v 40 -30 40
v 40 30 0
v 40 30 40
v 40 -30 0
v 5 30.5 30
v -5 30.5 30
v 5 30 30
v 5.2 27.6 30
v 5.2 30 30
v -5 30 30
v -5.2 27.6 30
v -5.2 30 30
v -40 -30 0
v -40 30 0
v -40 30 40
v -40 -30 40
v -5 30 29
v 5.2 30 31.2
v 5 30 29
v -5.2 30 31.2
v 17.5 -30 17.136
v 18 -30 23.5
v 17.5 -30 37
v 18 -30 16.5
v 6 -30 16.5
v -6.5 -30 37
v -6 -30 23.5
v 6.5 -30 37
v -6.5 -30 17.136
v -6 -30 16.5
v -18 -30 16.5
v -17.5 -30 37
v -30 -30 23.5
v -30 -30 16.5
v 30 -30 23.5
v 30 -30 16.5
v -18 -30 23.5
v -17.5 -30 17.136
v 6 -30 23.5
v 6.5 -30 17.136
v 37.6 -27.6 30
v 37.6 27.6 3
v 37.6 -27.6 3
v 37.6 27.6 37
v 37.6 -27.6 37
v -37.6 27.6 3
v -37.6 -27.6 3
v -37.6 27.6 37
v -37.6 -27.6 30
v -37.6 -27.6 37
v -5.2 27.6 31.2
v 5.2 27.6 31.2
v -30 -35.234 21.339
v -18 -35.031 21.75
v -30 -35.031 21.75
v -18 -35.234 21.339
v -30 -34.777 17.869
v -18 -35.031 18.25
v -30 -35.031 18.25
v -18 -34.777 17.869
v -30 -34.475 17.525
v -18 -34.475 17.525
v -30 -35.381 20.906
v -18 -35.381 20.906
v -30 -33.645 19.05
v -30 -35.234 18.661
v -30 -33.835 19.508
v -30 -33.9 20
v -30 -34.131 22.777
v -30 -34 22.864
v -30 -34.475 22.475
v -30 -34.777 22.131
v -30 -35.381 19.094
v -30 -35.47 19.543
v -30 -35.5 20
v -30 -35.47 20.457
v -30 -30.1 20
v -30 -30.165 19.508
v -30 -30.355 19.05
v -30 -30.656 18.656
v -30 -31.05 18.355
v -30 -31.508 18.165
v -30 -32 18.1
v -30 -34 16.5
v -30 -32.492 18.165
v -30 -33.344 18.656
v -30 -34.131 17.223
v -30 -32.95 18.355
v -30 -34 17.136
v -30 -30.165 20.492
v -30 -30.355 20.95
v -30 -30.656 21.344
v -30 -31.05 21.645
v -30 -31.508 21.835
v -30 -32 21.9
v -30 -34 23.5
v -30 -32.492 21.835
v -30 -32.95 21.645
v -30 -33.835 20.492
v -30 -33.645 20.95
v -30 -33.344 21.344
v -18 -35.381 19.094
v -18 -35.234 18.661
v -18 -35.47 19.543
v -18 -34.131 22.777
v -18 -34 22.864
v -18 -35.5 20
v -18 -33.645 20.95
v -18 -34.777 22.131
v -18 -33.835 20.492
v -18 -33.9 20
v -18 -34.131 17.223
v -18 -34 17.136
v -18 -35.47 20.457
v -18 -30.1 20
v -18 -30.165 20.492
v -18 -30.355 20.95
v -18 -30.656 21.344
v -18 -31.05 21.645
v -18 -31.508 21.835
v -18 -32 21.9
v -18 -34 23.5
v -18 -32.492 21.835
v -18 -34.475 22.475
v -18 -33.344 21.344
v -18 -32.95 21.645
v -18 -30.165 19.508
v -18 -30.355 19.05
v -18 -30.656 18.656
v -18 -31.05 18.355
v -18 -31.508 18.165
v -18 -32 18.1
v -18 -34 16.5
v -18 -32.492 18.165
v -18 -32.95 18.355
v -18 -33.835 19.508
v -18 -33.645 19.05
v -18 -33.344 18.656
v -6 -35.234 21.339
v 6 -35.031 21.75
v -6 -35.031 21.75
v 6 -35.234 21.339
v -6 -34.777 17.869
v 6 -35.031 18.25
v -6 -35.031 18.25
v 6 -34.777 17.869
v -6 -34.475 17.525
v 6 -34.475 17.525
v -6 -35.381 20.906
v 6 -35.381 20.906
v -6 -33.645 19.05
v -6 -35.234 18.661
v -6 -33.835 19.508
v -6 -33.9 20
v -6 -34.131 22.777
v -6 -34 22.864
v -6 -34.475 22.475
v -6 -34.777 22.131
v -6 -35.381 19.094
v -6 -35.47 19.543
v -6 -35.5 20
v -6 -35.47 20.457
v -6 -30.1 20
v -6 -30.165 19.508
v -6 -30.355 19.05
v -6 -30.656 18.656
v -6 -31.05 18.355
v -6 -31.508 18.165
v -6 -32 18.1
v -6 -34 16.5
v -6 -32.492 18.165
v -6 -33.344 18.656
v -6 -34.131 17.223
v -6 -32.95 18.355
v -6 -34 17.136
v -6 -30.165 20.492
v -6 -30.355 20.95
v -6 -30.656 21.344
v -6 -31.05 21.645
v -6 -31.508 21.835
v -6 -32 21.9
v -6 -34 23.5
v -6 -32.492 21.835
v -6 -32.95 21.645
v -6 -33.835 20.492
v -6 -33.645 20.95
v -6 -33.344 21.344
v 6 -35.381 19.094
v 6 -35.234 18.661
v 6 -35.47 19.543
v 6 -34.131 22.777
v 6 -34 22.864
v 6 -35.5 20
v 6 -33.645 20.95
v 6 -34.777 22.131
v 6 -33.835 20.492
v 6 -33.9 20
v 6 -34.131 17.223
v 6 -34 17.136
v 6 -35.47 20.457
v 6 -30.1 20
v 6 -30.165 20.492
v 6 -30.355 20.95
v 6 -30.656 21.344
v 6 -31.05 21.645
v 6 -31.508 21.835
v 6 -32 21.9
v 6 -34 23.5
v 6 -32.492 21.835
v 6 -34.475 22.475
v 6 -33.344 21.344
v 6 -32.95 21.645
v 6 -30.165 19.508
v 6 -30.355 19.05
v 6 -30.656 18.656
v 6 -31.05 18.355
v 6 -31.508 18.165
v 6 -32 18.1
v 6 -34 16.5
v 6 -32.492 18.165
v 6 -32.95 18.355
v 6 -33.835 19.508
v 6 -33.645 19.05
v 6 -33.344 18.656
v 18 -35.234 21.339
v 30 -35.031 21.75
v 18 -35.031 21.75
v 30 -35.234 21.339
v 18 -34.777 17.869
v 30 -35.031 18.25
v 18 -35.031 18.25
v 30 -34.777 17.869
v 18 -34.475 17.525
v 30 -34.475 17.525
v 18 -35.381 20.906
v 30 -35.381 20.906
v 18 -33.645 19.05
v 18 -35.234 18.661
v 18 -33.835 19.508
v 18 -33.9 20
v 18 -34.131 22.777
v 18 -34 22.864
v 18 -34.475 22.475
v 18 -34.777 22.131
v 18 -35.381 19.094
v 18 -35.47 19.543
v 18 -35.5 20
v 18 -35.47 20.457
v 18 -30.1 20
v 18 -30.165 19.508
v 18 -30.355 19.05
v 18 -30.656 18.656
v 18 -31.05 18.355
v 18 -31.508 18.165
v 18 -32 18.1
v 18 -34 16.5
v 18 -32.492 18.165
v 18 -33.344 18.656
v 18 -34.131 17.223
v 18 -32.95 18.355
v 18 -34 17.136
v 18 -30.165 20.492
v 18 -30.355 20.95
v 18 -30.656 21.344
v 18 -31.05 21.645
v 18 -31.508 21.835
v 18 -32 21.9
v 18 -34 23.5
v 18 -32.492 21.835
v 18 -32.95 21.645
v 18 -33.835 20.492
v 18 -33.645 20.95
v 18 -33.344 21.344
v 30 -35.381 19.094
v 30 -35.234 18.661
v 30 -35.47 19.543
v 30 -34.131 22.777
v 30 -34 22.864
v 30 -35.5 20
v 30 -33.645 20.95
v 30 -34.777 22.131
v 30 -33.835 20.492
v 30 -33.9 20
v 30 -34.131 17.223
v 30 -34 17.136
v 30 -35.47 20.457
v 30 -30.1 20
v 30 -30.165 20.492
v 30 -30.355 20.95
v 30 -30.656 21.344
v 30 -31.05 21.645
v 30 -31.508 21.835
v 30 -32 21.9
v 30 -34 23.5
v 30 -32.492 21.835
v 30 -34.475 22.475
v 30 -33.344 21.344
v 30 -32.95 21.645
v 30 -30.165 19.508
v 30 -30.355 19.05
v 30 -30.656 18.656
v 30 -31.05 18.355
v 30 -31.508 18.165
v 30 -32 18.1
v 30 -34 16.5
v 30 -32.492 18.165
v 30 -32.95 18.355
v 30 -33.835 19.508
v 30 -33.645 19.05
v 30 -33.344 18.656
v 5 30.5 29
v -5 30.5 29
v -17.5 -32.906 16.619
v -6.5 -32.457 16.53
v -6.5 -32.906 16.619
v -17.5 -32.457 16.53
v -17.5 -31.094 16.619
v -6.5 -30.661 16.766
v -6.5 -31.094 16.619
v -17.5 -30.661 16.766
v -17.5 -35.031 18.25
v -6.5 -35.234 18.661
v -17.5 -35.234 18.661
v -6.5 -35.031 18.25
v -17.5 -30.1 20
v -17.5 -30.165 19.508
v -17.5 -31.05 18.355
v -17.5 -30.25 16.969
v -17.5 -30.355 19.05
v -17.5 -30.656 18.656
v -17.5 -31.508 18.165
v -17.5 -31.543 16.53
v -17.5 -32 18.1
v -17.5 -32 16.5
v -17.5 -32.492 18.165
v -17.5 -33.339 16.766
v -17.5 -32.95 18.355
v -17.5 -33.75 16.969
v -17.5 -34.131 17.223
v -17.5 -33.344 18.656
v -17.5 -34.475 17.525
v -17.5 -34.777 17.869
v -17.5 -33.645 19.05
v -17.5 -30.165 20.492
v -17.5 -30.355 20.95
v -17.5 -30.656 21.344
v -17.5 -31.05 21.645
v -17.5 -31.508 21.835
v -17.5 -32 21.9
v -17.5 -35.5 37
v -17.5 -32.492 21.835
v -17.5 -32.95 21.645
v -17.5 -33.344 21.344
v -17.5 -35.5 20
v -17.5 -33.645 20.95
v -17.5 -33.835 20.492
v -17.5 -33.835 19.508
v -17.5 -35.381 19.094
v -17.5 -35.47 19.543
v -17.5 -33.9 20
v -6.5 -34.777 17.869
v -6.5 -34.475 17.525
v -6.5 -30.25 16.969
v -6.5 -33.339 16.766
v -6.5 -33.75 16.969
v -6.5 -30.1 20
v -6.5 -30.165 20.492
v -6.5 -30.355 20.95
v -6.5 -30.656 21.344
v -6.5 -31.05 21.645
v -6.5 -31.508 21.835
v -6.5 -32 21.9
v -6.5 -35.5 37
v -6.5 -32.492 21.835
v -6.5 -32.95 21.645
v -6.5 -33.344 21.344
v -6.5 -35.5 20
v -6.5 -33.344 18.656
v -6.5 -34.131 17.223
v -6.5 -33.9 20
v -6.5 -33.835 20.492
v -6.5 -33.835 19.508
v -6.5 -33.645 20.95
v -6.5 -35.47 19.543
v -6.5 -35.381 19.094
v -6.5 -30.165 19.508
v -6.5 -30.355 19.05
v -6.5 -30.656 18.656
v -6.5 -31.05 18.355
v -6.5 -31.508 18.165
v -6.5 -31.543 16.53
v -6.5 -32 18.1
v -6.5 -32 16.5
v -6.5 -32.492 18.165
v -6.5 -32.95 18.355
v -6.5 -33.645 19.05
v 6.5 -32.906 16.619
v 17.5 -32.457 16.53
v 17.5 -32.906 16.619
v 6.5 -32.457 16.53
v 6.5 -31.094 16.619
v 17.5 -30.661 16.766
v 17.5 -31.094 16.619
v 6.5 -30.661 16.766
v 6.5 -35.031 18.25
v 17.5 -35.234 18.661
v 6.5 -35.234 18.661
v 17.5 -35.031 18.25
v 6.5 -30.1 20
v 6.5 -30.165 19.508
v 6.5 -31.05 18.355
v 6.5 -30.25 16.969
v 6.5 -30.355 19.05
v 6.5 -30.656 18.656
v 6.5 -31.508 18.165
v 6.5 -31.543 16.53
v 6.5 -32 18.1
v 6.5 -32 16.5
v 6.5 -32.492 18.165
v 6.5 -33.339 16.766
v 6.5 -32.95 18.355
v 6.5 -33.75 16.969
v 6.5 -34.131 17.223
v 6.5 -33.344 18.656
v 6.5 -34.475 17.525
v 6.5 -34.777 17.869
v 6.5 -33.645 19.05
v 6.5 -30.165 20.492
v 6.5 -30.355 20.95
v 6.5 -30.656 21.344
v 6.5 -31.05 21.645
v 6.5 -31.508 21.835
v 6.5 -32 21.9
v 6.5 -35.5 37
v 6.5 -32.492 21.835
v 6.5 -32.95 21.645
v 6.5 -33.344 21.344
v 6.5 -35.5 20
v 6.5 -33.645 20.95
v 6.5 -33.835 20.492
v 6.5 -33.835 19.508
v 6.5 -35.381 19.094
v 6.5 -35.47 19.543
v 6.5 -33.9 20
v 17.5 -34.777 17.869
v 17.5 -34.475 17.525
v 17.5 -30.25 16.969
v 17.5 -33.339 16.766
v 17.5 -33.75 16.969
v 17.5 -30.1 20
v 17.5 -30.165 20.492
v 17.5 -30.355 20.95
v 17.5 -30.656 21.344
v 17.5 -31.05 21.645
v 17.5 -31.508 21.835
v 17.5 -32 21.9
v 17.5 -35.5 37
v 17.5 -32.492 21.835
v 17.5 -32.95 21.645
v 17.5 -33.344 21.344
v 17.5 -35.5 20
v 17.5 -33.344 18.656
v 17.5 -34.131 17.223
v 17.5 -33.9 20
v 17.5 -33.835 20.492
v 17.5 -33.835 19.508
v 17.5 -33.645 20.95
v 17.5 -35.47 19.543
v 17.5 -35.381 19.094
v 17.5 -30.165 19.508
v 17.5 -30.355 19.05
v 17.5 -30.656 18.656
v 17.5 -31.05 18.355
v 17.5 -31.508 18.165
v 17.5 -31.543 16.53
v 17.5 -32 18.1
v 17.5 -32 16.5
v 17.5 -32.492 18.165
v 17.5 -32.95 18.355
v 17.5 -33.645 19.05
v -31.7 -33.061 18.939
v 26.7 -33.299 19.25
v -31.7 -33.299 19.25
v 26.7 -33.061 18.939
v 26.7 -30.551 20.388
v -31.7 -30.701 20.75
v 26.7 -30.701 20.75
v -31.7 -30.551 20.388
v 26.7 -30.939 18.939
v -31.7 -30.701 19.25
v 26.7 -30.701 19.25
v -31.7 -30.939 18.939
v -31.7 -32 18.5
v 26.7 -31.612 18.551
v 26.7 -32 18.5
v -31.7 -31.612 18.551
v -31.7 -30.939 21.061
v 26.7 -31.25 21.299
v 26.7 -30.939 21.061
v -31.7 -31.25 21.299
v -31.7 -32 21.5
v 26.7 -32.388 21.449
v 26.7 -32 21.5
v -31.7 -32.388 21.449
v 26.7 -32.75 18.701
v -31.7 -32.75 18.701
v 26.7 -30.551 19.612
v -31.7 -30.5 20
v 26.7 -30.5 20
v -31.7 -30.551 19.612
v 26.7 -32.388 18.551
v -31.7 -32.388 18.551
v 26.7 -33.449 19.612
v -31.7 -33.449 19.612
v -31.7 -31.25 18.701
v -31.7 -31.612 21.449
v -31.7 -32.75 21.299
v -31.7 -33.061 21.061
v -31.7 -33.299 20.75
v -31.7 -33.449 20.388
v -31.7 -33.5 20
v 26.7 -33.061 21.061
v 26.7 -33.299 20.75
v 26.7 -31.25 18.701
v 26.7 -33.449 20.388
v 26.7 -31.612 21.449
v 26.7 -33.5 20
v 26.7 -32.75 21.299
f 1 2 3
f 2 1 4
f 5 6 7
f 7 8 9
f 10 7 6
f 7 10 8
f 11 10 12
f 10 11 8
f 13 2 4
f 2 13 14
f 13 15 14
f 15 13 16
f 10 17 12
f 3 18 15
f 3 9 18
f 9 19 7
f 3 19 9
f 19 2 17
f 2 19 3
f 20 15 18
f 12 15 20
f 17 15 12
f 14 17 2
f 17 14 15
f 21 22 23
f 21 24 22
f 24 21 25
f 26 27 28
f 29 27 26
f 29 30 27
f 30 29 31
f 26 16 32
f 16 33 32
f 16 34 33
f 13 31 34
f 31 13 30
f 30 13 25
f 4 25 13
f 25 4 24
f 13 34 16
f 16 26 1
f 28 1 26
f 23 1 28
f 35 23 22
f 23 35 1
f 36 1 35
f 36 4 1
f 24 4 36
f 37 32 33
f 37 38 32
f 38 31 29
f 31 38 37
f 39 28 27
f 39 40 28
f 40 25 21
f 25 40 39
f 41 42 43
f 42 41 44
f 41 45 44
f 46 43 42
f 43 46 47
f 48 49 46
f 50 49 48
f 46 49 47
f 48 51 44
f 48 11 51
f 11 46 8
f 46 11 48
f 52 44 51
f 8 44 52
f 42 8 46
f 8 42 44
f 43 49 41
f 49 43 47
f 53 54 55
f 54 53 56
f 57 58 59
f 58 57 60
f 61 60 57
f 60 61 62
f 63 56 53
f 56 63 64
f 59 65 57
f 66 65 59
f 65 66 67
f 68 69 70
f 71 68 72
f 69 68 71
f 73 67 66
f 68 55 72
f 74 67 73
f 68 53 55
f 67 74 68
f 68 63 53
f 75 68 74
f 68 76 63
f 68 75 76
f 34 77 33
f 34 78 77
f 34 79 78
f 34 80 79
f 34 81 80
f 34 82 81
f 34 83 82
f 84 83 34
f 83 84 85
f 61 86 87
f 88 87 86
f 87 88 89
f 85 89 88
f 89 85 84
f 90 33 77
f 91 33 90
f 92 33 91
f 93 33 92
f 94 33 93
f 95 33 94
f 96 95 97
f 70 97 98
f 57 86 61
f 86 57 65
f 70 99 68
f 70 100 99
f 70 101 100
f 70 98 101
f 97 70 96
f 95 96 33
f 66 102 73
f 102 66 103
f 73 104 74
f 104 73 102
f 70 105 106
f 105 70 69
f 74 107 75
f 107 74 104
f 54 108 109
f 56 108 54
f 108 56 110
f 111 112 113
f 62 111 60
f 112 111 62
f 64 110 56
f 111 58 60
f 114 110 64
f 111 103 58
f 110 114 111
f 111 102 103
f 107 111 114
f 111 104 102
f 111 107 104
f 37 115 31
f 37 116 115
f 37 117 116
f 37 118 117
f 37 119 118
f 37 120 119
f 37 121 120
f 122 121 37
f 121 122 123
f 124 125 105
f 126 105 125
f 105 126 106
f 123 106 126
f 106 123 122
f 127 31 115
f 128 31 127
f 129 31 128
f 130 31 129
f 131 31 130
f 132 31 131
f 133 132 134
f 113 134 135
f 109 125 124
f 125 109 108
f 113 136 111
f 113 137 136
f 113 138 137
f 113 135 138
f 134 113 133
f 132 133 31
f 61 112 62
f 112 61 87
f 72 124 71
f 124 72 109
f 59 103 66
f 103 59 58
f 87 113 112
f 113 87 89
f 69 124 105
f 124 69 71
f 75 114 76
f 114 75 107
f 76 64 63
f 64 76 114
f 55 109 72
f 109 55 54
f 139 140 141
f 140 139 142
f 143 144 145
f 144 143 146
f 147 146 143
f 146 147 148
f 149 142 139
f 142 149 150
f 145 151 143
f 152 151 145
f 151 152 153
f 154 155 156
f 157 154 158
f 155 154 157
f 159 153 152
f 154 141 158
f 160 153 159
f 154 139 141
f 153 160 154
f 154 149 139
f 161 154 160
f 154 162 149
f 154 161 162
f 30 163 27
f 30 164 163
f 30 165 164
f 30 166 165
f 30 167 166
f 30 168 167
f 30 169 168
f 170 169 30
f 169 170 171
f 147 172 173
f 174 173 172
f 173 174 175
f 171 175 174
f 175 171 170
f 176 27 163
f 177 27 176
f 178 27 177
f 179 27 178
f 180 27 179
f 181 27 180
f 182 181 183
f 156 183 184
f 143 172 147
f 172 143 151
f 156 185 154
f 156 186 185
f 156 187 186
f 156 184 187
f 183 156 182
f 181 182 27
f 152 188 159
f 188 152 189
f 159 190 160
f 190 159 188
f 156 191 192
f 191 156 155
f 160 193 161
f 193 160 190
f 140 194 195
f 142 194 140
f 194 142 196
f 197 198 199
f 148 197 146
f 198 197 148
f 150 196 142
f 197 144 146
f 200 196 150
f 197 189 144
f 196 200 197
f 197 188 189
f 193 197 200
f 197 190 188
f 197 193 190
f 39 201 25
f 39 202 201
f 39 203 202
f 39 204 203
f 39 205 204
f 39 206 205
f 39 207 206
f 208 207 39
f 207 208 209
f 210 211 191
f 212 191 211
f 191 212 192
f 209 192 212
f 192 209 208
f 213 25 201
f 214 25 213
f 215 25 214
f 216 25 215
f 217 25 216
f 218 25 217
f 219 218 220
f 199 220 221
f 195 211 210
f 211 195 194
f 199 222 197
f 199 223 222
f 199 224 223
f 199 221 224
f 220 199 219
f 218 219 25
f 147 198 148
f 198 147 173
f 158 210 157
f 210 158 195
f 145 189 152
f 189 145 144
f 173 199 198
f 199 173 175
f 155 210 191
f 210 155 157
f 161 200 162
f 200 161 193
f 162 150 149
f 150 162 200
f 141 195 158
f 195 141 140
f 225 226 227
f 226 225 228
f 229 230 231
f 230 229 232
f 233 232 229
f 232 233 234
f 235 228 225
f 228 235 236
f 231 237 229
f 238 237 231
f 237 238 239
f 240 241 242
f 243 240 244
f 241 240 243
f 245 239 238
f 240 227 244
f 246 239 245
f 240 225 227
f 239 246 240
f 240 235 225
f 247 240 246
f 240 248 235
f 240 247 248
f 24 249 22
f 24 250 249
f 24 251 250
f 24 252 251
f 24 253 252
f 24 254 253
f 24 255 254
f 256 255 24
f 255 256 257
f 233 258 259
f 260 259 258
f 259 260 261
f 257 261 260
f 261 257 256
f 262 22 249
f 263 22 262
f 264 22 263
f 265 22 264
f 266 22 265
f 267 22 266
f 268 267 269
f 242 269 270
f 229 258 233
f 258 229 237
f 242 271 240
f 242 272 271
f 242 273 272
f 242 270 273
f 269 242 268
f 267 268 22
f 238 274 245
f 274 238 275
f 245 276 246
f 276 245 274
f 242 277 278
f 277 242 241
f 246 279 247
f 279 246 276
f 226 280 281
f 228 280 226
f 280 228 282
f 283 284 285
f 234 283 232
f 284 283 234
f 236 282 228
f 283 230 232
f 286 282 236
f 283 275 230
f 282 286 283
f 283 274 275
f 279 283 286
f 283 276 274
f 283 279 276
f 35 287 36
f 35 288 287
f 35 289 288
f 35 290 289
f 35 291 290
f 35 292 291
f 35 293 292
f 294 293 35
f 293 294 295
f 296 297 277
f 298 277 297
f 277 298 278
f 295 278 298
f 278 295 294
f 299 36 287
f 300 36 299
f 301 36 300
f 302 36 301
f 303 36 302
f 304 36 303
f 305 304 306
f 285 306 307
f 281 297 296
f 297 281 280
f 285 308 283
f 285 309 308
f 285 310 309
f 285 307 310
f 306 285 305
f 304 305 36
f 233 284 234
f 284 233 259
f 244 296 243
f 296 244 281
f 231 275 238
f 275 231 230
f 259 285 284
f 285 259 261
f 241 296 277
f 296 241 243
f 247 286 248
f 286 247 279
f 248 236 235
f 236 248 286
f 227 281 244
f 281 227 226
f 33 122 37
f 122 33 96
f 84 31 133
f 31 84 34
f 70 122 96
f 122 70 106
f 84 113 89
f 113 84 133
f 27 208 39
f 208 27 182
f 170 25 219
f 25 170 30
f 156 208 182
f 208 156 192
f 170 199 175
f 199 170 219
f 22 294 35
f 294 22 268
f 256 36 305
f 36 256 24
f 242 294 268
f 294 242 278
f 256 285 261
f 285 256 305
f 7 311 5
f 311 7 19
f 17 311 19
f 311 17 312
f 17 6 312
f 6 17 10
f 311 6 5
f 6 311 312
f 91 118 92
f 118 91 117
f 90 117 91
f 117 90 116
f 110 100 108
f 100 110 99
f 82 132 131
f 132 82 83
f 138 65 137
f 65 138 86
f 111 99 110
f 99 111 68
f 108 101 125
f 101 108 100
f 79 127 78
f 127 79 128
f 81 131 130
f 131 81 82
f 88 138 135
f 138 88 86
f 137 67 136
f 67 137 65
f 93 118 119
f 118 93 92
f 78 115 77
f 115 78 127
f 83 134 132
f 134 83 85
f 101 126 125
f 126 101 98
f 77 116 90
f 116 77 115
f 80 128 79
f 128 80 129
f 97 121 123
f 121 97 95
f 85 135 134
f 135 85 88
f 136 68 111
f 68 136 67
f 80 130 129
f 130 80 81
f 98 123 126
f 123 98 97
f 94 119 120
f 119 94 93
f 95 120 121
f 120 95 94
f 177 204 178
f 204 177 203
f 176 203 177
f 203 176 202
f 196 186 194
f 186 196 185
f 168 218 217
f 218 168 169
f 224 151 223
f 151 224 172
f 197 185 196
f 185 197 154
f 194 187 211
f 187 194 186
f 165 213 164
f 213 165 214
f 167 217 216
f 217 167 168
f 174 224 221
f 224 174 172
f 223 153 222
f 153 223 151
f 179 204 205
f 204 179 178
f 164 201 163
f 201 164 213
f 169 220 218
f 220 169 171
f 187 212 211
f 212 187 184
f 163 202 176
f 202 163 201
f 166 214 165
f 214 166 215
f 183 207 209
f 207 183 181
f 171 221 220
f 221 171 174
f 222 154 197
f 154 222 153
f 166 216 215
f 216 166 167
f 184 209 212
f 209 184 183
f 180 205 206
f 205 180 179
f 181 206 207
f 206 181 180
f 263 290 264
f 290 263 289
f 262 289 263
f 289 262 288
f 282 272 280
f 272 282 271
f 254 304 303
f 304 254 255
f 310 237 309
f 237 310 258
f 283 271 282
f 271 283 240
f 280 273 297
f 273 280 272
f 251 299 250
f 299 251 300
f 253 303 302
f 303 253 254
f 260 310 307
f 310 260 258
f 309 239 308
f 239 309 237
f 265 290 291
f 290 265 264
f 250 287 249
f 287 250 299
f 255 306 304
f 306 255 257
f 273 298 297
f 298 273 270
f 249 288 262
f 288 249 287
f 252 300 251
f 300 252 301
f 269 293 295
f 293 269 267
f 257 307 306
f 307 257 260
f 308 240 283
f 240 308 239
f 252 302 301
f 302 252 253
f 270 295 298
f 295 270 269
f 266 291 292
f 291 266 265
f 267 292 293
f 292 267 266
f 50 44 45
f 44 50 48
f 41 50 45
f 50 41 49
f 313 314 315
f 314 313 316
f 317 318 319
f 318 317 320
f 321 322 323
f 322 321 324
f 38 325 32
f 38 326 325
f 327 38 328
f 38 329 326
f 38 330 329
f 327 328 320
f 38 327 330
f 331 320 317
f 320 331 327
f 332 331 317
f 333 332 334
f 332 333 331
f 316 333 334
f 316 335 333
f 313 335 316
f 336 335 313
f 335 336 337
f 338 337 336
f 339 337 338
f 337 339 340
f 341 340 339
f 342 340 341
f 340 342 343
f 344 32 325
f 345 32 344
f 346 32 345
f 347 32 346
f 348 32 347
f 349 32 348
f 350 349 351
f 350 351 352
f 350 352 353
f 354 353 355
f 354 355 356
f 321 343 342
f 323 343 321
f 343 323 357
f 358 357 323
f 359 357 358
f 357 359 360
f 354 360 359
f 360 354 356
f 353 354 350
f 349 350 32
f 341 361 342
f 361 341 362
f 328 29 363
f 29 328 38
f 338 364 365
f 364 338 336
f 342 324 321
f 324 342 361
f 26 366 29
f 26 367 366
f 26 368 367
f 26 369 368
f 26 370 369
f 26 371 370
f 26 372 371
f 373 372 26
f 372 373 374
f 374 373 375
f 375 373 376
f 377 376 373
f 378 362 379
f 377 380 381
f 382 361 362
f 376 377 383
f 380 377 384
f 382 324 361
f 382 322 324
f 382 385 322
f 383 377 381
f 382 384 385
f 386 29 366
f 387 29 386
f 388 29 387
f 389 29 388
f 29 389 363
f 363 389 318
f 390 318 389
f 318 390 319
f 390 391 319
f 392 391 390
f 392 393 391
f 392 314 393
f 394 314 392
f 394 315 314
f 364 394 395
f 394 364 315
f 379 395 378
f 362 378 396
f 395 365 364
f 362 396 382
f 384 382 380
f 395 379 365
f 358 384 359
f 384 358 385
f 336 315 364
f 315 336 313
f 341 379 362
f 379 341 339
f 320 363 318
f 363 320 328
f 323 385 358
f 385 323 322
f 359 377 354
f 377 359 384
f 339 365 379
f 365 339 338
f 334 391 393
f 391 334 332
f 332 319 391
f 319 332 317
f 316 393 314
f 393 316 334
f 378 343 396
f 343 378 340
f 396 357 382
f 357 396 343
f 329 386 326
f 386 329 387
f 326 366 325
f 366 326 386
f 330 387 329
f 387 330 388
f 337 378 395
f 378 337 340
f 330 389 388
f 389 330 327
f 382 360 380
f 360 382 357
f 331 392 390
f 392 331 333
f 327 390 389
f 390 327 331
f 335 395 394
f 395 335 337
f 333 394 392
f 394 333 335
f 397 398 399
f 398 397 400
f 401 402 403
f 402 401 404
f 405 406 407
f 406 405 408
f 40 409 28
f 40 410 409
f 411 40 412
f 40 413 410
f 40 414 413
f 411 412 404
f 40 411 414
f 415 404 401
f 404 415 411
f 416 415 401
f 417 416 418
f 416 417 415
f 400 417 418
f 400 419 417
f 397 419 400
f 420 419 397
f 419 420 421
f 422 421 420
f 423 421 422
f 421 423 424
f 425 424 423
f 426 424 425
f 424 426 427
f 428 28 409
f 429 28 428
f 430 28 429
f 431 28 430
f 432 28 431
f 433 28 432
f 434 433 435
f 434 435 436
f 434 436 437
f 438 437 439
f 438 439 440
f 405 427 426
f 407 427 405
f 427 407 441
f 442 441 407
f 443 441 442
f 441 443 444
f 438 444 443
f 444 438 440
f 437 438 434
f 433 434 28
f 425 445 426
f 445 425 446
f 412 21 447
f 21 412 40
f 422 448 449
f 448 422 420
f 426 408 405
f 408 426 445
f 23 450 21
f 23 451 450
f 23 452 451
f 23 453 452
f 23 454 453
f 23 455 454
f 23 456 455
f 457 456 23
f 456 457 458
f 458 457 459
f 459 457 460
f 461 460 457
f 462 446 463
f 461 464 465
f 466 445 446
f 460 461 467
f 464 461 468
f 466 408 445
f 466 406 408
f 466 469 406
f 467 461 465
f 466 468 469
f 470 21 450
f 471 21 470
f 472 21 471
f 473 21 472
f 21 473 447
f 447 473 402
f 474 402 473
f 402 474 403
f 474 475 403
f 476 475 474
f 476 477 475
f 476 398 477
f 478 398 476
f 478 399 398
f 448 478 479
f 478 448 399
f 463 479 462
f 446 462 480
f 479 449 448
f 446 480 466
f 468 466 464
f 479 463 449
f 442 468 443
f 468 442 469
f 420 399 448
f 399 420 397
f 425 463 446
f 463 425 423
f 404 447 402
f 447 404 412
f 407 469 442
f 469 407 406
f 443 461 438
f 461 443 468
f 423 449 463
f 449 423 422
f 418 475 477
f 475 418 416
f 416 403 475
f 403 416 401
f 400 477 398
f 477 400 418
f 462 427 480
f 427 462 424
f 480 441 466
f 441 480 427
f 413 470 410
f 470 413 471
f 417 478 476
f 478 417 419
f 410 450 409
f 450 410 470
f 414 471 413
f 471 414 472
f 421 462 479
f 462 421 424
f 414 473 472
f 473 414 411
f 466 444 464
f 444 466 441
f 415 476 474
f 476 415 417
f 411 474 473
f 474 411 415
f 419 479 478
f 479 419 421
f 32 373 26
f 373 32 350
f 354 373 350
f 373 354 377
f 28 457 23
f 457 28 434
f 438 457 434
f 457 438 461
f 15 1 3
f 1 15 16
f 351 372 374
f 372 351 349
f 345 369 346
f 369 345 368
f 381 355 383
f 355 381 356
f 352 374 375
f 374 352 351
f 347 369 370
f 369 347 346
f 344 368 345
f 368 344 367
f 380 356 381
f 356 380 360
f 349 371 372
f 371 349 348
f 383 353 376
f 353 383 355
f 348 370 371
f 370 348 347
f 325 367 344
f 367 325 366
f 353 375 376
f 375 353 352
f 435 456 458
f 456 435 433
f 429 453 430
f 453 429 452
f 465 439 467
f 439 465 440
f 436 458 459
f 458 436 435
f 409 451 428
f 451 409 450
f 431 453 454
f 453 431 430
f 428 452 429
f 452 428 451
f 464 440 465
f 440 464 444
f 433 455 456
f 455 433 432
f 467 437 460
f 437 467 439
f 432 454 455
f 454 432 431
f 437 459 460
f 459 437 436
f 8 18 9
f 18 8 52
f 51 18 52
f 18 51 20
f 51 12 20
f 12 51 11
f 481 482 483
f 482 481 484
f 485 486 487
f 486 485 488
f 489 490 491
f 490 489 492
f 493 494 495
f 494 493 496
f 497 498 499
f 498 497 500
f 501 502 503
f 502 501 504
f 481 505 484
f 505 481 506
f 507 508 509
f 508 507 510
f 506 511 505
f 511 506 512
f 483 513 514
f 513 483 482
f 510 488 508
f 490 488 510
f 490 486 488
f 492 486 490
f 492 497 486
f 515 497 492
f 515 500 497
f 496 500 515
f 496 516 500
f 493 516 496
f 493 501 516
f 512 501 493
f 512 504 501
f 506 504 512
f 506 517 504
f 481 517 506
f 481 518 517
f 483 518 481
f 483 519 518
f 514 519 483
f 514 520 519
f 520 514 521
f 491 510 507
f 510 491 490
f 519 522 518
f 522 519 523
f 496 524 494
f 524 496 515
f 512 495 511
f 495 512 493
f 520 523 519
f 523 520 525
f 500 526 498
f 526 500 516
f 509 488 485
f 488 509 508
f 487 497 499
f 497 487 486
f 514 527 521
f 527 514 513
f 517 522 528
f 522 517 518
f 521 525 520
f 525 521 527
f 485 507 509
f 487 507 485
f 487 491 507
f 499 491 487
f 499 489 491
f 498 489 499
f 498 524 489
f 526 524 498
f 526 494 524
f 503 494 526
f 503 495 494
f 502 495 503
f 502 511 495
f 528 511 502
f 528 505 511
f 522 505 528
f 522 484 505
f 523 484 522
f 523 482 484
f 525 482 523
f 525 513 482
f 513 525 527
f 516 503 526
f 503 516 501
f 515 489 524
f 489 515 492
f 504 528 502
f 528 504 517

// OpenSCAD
part = "assembly"; // [base, lid, pin, assembly]
cadverify_only = "";
module instance(name, part, unit = 1) {
  echo(cadverify_instance = [name, part, unit]);
  if (cadverify_only == "" || cadverify_only == name) children();
}
Bx=80; By=60; Hb=30; Lt=3; Sk=7; Wt=2.4; Bt=3;
Ya=-32; Za=20; Kr=3.5; Br=1.9; Pr=1.5;
module barrel(x0,x1) {
  difference() {
    translate([0,Ya,Za]) rotate([0,90,0]) translate([0,0,(x0+x1)/2])
      cylinder(h=x1-x0, r=Kr, center=true, $fn=48);
    translate([0,Ya,Za]) rotate([0,90,0]) translate([0,0,(x0+x1)/2])
      cylinder(h=(x1-x0)+0.8, r=Br, center=true, $fn=24);
  }
}
module base_geom() {
  difference() {
    union() {
      difference() {
        translate([-40,-30,0]) cube([80,60,30]);
        translate([-37.6,-27.6,3]) cube([75.2,55.2,27.01]);
      }
      for (b=[[-30,-18],[-6,6],[18,30]]) {
        translate([b[0],-34,16.5]) cube([b[1]-b[0],5.5,7.0]);
        barrel(b[0],b[1]);
      }
      translate([-5,29.0,29.0]) cube([10,1.5,1.0]);
    }
    for (b=[[-30,-18],[-6,6],[18,30]])
      translate([0,Ya,Za]) rotate([0,90,0]) translate([0,0,(b[0]+b[1])/2])
        cylinder(h=(b[1]-b[0])+0.8, r=Br, center=true, $fn=24);
  }
}
module lid_open() {
  difference() {
    union() {
      translate([-40,-94,0]) cube([80,60,3]);
      difference() {
        translate([-40,-94,3]) cube([80,60,7]);
        translate([-37.6,-91.6,3]) cube([75.2,55.2,7.01]);
      }
      for (b=[[-17.5,-6.5],[6.5,17.5]]) {
        translate([b[0],-34,3]) cube([b[1]-b[0],5.5,17.0]);
        barrel(b[0],b[1]);
      }
    }
    translate([-5.2,-94.1,8.8]) cube([10.4,2.6,1.3]);
    for (b=[[-17.5,-6.5],[6.5,17.5]])
      translate([0,Ya,Za]) rotate([0,90,0]) translate([0,0,(b[0]+b[1])/2])
        cylinder(h=(b[1]-b[0])+0.8, r=Br, center=true, $fn=24);
  }
}
module pin_vert() {
  translate([0,0,0.8]) cylinder(h=58.4, r=Pr, center=false, $fn=24);
}
module lid_closed() {
  translate([0,Ya,Za]) rotate([180,0,0]) translate([0,-Ya,-Za]) lid_open();
}
module pin_placed() {
  translate([0,Ya,Za]) rotate([0,90,0]) translate([0,0,-32.5]) pin_vert();
}
if (part=="base") {
  base_geom();
  echo(cadverify_spec=[
    ["bounds", [[-40,-35.5,0],[40,30.5,30]]],
    ["bodies", 1],
    ["support_faces", [["base","-z",4000]]],
    ["overhangs_allowed", [["hinge", [[-30,-35.5,14],[30,-28.5,24]]]]],
    ["copies", 1],
    ["details", [
      ["bottom","thickness",[0,0,-1],[0,0,1],3],
      ["cavity","void",[[-37.6,-27.6,3],[37.6,27.6,30]],0.9],
      ["knuckle","material",[[-30,-35.5,16.5],[-18,-28.5,23.5]],0.5],
      ["bore","hole",[-31,-32,20],[1,0,0],[[0,3.8],[12,3.8]]],
      ["catch","material",[[-5,29,29],[5,30.5,30]],0.8]
    ]]
  ]);
} else if (part=="lid") {
  lid_open();
  echo(cadverify_spec=[
    ["bounds", [[-40,-94,0],[40,-28.5,23.5]]],
    ["bodies", 1],
    ["support_faces", [["lid","-z",4000]]],
    ["overhangs_allowed", [["hinge", [[-17.5,-35.5,14],[17.5,-28.5,24]]]]],
    ["copies", 1],
    ["details", [
      ["plate","thickness",[0,-64,-1],[0,0,1],3],
      ["pocket","void",[[-37.6,-91.6,3],[37.6,-36.4,10]],0.9],
      ["knuckle","material",[[-17.5,-35.5,16.5],[-6.5,-28.5,23.5]],0.5],
      ["bore","hole",[-18,-32,20],[1,0,0],[[0,3.8],[11,3.8]]],
      ["notch","void",[[-5.2,-94.1,8.8],[5.2,-91.5,10.1]],0.9]
    ]]
  ]);
} else if (part=="pin") {
  pin_vert();
  echo(cadverify_spec=[
    ["bounds", [[-3,-3,0.8],[3,3,59.2]]],
    ["bodies", 1],
    ["support_faces", [["pin","-z",5]]],
    ["overhangs_allowed", []],
    ["copies", 1],
    ["details", [
      ["shaft","thickness",[5,0,32],[-1,0,0],3]
    ]]
  ]);
} else {
  instance("base","base") base_geom();
  instance("lid","lid") lid_closed();
  instance("pin","pin") pin_placed();
  echo(cadverify_spec=[
    ["bounds", [[-40,-35.5,0],[40,30.5,40]]],
    ["support_faces", [["bed","-z",4000]]],
    ["motions", [["swing",["lid"],"rotate",[0,-32,20],[1,0,0],[0,180]]]],
    ["assembly_order", [[["base"],[0,0,0]],[["lid"],[0,0,1]],[["pin"],[-1,0,0]]]],
    ["print_in_place", 0.4],
    ["print_pose", [["swing",180]]],
    ["overhangs_allowed", [["hinge", [[-30,-35.5,14],[30,-28.5,24]]]]]
  ]);
}
